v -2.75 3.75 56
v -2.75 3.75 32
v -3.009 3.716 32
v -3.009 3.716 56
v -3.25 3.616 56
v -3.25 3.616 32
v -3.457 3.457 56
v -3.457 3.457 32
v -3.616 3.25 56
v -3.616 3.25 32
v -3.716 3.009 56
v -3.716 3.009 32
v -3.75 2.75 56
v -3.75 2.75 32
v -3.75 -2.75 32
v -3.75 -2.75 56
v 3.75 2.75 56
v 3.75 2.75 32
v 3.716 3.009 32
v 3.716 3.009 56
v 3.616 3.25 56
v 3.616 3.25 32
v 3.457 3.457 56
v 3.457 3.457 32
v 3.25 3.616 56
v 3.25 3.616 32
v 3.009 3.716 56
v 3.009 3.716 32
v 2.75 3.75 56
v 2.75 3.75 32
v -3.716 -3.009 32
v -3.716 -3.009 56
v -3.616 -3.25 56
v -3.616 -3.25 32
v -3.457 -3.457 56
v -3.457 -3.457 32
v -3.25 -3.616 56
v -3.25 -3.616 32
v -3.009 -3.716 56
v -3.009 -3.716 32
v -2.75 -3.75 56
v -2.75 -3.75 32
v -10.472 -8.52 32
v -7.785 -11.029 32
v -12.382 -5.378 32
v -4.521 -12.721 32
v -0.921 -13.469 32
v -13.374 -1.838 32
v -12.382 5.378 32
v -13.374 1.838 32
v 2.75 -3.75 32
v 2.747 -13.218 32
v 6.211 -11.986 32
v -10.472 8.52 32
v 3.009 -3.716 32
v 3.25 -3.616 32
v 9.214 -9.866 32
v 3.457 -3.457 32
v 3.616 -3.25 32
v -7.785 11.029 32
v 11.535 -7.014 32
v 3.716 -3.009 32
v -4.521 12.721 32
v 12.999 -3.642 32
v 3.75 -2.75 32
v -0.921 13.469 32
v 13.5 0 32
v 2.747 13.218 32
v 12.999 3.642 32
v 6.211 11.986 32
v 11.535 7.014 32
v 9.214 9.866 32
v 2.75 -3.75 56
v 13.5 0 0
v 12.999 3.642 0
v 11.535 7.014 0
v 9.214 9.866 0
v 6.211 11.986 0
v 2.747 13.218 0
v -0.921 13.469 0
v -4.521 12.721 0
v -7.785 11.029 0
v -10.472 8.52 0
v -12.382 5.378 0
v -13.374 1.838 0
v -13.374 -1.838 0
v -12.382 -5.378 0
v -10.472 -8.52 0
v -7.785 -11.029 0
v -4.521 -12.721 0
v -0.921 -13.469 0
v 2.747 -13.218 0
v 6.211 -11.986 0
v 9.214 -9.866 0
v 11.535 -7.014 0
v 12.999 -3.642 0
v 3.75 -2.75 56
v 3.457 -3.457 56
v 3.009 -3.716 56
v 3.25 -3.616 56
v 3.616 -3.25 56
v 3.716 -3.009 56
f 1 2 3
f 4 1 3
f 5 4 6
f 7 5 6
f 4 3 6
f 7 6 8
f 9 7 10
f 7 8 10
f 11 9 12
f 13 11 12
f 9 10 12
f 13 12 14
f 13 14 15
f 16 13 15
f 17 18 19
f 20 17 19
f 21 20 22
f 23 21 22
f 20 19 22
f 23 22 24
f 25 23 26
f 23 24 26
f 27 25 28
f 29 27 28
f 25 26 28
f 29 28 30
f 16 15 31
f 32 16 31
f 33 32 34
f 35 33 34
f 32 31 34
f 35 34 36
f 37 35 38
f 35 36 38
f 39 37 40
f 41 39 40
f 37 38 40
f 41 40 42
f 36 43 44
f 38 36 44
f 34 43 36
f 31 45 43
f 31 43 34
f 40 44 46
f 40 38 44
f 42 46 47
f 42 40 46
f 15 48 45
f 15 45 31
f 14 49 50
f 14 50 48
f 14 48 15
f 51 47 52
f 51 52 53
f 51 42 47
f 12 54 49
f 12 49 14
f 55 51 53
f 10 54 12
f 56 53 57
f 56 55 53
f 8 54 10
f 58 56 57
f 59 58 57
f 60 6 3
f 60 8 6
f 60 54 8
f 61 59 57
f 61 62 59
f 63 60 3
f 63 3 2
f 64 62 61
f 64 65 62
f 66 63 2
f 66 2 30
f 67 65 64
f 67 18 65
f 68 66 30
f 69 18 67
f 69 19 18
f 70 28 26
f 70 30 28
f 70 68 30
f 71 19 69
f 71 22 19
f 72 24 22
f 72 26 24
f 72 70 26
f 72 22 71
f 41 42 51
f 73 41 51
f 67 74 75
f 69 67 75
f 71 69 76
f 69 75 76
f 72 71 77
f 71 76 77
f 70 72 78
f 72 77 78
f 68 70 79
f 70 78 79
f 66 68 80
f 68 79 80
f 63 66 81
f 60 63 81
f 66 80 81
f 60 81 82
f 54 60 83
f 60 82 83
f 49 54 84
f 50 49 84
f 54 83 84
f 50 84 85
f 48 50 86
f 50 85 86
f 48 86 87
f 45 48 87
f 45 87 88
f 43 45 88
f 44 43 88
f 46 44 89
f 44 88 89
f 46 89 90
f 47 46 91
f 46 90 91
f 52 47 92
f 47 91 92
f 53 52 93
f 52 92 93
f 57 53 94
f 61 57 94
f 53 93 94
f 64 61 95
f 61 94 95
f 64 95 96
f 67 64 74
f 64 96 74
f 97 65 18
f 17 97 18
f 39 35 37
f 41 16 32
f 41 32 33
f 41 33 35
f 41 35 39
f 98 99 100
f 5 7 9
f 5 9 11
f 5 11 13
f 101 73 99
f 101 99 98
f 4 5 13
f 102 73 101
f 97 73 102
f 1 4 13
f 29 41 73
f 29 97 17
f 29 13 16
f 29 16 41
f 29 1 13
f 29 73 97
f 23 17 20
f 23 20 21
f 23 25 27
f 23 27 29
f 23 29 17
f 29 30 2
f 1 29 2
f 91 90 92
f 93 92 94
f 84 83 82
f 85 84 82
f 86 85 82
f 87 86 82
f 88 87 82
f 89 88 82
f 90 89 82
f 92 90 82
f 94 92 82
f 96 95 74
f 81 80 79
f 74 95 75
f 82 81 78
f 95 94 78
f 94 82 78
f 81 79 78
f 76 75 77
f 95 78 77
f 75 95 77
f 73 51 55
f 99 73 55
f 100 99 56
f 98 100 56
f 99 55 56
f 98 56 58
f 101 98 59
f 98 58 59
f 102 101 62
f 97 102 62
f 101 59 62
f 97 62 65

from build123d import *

# Parameters (mm, degrees)
SKETCH1_R           = 13.5
BOSS_EXTRUDE1_DEPTH = 32
BOSS_EXTRUDE2_DEPTH = 24


with BuildPart() as part:
    # Sketch1 → Boss-Extrude1 (new body)
    with BuildSketch(Plane.XY):
        Circle(SKETCH1_R)
    extrude(amount=BOSS_EXTRUDE1_DEPTH)

    # Sketch2 → Boss-Extrude2 (add)
    with BuildSketch(Plane.XY.offset(32)):
        with BuildLine():
            Line((-2.75, -3.75), (2.75, -3.75))
            ThreePointArc((2.75, -3.75), (3.457106781, -3.457106781), (3.75, -2.75))
            Line((3.75, -2.75), (3.75, 2.75))
            ThreePointArc((3.75, 2.75), (3.457106781, 3.457106781), (2.75, 3.75))
            Line((2.75, 3.75), (-2.75, 3.75))
            ThreePointArc((-2.75, 3.75), (-3.457106781, 3.457106781), (-3.75, 2.75))
            Line((-3.75, 2.75), (-3.75, -2.75))
            ThreePointArc((-3.75, -2.75), (-3.457106781, -3.457106781), (-2.75, -3.75))
        make_face()
    extrude(amount=BOSS_EXTRUDE2_DEPTH)


solid = part.part
